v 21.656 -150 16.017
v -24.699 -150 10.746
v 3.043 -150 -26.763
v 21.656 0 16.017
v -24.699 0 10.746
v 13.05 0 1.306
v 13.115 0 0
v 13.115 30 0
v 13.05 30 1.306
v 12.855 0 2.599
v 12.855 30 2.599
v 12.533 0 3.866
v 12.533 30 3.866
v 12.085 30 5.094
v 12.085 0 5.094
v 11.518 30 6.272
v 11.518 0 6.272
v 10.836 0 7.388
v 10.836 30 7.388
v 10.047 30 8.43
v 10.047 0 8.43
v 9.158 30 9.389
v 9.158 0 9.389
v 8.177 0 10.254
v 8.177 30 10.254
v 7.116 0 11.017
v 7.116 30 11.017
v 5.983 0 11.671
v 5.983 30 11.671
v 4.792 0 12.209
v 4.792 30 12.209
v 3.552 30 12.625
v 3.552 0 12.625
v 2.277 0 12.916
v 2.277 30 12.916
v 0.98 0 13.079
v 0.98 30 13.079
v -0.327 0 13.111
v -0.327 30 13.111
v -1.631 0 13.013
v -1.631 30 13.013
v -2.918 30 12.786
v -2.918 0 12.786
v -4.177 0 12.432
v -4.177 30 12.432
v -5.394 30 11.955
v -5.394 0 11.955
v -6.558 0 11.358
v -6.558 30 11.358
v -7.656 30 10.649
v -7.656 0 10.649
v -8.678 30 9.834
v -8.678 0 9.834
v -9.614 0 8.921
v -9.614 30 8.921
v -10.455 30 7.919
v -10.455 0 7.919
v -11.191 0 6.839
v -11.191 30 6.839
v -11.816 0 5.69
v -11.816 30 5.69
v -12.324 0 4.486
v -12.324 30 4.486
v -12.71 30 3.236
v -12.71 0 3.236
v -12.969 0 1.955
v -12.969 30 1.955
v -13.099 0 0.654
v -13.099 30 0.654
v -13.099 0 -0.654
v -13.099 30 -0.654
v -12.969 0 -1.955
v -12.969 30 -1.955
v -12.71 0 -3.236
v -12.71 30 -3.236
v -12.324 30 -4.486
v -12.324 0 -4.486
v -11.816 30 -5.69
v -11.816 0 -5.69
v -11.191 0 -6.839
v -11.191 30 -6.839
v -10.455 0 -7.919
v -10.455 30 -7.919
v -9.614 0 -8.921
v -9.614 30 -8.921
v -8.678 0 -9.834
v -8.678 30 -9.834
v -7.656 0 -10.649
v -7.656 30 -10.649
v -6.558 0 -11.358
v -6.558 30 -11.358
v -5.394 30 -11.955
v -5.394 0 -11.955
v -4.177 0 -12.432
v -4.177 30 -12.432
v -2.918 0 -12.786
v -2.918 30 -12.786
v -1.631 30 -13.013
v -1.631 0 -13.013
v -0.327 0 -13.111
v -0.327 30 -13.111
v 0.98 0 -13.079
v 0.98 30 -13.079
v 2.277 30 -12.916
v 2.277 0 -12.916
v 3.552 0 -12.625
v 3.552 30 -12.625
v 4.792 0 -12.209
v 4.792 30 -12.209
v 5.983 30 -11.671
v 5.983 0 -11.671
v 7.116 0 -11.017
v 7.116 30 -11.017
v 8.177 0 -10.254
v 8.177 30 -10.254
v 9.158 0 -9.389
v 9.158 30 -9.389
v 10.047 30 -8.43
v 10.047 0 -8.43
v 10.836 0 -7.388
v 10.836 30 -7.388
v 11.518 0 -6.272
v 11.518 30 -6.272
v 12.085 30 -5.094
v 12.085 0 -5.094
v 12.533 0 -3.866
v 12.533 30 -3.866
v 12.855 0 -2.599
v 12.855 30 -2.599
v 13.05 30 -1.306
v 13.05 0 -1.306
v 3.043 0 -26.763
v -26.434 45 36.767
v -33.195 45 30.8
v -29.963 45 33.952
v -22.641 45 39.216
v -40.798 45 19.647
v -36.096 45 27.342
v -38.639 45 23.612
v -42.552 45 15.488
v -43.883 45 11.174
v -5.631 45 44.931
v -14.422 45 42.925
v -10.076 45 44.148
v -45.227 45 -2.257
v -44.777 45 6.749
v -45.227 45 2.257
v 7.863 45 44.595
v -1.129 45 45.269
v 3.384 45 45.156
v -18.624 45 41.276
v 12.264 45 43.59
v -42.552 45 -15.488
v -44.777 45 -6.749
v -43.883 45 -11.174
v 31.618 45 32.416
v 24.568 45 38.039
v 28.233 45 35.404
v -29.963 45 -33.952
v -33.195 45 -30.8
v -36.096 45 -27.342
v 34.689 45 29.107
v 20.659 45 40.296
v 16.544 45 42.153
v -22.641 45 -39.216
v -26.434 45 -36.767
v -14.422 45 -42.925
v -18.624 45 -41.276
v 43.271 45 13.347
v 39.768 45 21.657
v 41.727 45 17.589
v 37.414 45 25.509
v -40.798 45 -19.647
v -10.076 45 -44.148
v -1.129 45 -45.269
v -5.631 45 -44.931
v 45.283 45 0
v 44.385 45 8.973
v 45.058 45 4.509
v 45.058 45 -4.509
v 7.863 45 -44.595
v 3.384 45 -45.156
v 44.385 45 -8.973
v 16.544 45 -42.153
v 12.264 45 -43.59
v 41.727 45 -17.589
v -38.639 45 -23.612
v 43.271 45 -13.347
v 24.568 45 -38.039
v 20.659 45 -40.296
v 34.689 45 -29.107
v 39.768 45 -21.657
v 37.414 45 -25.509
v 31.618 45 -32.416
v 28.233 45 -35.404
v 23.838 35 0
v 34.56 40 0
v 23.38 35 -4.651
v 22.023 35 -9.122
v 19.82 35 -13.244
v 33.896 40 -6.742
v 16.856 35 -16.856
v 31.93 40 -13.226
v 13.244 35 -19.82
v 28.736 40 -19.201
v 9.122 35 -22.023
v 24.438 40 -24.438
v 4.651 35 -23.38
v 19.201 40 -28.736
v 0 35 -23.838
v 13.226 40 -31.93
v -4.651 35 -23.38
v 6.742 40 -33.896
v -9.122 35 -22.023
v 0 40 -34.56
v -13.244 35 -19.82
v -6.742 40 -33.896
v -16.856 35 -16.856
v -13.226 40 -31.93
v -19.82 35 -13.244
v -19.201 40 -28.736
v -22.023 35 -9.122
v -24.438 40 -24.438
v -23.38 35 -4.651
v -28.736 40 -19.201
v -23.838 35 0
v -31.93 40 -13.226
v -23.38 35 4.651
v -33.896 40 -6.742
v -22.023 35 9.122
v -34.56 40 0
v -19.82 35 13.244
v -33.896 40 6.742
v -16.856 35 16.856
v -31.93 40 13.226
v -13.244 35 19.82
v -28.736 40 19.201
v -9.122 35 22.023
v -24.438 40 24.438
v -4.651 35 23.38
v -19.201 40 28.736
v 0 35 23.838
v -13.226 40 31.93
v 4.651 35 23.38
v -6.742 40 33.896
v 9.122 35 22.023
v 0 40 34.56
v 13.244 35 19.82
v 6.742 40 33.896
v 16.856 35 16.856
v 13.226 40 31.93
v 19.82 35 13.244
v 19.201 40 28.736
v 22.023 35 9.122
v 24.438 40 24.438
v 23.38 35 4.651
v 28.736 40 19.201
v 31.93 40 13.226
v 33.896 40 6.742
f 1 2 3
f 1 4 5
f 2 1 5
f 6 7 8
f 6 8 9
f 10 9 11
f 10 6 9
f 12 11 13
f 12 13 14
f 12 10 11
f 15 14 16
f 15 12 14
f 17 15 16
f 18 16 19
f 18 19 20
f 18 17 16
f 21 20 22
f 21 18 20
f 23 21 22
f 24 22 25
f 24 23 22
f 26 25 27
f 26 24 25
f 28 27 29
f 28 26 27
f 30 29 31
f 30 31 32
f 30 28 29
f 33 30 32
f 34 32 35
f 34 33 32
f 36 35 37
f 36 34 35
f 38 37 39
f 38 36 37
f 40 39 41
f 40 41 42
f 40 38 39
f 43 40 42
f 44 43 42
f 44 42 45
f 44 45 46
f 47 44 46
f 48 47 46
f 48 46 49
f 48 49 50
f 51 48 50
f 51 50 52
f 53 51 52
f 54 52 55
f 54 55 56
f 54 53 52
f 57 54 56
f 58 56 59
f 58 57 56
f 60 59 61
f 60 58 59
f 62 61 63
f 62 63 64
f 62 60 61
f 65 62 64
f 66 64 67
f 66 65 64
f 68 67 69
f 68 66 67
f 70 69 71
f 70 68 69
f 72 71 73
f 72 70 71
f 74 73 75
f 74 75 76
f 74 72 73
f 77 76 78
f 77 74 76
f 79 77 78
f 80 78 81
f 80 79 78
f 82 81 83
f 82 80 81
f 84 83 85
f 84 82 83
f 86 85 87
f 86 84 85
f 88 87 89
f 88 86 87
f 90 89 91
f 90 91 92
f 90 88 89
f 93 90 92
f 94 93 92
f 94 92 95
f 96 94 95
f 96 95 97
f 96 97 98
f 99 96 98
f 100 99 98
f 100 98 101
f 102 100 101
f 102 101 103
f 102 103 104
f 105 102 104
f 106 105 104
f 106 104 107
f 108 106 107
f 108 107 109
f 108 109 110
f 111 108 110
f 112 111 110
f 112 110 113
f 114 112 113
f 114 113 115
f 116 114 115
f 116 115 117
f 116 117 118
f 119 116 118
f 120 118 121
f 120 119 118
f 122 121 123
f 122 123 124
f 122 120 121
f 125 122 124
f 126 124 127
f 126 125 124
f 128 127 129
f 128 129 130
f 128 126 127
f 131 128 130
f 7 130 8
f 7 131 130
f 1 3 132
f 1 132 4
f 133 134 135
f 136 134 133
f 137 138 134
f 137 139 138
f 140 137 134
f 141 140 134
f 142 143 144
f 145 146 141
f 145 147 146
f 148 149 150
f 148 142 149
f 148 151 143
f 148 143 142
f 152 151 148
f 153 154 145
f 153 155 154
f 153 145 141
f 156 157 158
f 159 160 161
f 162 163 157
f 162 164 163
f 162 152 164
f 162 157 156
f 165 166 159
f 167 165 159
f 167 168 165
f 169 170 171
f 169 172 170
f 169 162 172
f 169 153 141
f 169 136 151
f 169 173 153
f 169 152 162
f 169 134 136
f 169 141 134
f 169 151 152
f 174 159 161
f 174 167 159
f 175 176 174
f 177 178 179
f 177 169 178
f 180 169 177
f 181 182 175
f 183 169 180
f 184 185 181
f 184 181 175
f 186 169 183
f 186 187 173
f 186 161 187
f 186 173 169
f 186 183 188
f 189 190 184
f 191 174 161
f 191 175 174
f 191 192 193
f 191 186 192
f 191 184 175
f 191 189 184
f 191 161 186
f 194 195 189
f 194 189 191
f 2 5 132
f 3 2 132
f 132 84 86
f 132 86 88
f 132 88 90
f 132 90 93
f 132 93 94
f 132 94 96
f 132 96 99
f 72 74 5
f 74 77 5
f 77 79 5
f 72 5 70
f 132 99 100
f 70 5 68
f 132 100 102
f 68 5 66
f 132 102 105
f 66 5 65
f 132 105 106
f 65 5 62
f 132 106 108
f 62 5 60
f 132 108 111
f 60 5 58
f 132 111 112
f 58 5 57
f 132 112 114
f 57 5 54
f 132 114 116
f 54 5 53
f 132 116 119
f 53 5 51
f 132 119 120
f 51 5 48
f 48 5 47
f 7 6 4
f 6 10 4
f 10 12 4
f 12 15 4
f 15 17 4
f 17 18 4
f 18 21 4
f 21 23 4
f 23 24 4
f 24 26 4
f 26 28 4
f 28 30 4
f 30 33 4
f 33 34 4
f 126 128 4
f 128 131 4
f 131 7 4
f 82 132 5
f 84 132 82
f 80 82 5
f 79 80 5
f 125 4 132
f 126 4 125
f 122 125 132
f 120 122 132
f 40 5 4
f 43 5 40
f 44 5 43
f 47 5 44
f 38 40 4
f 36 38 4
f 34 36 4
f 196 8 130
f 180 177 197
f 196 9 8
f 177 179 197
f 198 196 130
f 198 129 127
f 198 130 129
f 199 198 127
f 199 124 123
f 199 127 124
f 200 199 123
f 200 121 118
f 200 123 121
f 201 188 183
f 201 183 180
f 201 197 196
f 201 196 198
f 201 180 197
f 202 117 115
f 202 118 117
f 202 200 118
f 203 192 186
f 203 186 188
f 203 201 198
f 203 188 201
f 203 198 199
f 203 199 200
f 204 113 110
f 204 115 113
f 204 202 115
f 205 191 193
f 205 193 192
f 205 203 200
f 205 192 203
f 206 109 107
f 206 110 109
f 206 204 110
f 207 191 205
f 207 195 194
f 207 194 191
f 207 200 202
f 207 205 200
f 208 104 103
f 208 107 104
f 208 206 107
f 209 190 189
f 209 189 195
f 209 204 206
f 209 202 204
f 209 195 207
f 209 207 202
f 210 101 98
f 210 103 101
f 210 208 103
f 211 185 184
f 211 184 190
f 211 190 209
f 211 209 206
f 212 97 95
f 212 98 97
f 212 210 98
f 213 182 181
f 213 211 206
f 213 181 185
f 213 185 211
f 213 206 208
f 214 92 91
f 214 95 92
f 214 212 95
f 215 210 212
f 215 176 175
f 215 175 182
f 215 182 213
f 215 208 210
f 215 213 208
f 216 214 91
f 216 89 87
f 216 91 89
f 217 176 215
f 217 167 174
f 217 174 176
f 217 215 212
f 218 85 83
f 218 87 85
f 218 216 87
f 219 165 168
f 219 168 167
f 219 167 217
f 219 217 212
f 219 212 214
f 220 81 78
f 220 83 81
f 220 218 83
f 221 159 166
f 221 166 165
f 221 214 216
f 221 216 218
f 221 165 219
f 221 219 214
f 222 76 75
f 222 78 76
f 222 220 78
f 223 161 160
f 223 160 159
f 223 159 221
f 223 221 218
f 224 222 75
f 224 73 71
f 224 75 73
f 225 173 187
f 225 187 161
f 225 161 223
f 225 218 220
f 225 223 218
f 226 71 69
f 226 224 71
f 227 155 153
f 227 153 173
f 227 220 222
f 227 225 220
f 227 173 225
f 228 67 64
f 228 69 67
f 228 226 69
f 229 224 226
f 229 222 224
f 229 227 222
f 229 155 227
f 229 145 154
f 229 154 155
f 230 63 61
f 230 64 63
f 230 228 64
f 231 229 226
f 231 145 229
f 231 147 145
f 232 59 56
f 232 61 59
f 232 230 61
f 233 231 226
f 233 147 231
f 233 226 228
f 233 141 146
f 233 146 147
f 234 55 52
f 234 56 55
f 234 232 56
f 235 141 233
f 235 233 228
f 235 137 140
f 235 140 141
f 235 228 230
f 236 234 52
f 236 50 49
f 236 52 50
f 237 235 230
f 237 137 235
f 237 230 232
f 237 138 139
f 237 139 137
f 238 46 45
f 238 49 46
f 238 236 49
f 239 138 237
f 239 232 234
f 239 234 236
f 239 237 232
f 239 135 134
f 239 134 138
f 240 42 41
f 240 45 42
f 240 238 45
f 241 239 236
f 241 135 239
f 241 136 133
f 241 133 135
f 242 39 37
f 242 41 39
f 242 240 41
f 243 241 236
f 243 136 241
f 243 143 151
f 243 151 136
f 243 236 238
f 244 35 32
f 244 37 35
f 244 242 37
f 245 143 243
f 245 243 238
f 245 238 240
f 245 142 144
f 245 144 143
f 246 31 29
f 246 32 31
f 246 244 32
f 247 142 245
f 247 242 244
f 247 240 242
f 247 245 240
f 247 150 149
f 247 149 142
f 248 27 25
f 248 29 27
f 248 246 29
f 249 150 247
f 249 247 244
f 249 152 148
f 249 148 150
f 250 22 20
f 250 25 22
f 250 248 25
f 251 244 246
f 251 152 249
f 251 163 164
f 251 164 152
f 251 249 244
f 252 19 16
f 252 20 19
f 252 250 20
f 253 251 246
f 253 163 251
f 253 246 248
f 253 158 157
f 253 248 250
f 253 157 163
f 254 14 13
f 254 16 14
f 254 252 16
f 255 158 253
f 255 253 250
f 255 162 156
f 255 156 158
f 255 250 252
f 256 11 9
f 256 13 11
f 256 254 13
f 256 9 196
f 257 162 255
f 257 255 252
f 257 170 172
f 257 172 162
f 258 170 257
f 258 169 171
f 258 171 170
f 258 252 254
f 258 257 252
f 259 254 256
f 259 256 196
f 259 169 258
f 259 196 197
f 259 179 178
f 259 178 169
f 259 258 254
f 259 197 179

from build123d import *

# Parameters (mm, degrees)
F1_DEPTH  = 150
F2_R      = 13.1152364831
F3_DEPTH  = 30
F3_FACE_R = 13.1152364831
F4_DEPTH  = 15
F4_TAPER  = -65


with BuildPart() as f1:
    # F0 (on Front) → F1 (new body)
    with BuildSketch(Plane.XZ):
        Polygon((-24.6986329274, 10.7461681883), (3.0428618193, -26.762727648), (21.6557711081, 16.0165594597), align=None)
    extrude(amount=F1_DEPTH)

    # F2 (on Front) → F3 (join)
    with BuildSketch(Plane.XZ):
        Circle(F2_R)
    extrude(amount=-F3_DEPTH)

    # F3_face (on face) → F4 (join)
    with BuildSketch(Plane(origin=(0, 30, 0), x_dir=(1, 0, 0), z_dir=(0, 1, 0))):
        Circle(F3_FACE_R)
    extrude(amount=F4_DEPTH, taper=F4_TAPER)


solid = f1.part
